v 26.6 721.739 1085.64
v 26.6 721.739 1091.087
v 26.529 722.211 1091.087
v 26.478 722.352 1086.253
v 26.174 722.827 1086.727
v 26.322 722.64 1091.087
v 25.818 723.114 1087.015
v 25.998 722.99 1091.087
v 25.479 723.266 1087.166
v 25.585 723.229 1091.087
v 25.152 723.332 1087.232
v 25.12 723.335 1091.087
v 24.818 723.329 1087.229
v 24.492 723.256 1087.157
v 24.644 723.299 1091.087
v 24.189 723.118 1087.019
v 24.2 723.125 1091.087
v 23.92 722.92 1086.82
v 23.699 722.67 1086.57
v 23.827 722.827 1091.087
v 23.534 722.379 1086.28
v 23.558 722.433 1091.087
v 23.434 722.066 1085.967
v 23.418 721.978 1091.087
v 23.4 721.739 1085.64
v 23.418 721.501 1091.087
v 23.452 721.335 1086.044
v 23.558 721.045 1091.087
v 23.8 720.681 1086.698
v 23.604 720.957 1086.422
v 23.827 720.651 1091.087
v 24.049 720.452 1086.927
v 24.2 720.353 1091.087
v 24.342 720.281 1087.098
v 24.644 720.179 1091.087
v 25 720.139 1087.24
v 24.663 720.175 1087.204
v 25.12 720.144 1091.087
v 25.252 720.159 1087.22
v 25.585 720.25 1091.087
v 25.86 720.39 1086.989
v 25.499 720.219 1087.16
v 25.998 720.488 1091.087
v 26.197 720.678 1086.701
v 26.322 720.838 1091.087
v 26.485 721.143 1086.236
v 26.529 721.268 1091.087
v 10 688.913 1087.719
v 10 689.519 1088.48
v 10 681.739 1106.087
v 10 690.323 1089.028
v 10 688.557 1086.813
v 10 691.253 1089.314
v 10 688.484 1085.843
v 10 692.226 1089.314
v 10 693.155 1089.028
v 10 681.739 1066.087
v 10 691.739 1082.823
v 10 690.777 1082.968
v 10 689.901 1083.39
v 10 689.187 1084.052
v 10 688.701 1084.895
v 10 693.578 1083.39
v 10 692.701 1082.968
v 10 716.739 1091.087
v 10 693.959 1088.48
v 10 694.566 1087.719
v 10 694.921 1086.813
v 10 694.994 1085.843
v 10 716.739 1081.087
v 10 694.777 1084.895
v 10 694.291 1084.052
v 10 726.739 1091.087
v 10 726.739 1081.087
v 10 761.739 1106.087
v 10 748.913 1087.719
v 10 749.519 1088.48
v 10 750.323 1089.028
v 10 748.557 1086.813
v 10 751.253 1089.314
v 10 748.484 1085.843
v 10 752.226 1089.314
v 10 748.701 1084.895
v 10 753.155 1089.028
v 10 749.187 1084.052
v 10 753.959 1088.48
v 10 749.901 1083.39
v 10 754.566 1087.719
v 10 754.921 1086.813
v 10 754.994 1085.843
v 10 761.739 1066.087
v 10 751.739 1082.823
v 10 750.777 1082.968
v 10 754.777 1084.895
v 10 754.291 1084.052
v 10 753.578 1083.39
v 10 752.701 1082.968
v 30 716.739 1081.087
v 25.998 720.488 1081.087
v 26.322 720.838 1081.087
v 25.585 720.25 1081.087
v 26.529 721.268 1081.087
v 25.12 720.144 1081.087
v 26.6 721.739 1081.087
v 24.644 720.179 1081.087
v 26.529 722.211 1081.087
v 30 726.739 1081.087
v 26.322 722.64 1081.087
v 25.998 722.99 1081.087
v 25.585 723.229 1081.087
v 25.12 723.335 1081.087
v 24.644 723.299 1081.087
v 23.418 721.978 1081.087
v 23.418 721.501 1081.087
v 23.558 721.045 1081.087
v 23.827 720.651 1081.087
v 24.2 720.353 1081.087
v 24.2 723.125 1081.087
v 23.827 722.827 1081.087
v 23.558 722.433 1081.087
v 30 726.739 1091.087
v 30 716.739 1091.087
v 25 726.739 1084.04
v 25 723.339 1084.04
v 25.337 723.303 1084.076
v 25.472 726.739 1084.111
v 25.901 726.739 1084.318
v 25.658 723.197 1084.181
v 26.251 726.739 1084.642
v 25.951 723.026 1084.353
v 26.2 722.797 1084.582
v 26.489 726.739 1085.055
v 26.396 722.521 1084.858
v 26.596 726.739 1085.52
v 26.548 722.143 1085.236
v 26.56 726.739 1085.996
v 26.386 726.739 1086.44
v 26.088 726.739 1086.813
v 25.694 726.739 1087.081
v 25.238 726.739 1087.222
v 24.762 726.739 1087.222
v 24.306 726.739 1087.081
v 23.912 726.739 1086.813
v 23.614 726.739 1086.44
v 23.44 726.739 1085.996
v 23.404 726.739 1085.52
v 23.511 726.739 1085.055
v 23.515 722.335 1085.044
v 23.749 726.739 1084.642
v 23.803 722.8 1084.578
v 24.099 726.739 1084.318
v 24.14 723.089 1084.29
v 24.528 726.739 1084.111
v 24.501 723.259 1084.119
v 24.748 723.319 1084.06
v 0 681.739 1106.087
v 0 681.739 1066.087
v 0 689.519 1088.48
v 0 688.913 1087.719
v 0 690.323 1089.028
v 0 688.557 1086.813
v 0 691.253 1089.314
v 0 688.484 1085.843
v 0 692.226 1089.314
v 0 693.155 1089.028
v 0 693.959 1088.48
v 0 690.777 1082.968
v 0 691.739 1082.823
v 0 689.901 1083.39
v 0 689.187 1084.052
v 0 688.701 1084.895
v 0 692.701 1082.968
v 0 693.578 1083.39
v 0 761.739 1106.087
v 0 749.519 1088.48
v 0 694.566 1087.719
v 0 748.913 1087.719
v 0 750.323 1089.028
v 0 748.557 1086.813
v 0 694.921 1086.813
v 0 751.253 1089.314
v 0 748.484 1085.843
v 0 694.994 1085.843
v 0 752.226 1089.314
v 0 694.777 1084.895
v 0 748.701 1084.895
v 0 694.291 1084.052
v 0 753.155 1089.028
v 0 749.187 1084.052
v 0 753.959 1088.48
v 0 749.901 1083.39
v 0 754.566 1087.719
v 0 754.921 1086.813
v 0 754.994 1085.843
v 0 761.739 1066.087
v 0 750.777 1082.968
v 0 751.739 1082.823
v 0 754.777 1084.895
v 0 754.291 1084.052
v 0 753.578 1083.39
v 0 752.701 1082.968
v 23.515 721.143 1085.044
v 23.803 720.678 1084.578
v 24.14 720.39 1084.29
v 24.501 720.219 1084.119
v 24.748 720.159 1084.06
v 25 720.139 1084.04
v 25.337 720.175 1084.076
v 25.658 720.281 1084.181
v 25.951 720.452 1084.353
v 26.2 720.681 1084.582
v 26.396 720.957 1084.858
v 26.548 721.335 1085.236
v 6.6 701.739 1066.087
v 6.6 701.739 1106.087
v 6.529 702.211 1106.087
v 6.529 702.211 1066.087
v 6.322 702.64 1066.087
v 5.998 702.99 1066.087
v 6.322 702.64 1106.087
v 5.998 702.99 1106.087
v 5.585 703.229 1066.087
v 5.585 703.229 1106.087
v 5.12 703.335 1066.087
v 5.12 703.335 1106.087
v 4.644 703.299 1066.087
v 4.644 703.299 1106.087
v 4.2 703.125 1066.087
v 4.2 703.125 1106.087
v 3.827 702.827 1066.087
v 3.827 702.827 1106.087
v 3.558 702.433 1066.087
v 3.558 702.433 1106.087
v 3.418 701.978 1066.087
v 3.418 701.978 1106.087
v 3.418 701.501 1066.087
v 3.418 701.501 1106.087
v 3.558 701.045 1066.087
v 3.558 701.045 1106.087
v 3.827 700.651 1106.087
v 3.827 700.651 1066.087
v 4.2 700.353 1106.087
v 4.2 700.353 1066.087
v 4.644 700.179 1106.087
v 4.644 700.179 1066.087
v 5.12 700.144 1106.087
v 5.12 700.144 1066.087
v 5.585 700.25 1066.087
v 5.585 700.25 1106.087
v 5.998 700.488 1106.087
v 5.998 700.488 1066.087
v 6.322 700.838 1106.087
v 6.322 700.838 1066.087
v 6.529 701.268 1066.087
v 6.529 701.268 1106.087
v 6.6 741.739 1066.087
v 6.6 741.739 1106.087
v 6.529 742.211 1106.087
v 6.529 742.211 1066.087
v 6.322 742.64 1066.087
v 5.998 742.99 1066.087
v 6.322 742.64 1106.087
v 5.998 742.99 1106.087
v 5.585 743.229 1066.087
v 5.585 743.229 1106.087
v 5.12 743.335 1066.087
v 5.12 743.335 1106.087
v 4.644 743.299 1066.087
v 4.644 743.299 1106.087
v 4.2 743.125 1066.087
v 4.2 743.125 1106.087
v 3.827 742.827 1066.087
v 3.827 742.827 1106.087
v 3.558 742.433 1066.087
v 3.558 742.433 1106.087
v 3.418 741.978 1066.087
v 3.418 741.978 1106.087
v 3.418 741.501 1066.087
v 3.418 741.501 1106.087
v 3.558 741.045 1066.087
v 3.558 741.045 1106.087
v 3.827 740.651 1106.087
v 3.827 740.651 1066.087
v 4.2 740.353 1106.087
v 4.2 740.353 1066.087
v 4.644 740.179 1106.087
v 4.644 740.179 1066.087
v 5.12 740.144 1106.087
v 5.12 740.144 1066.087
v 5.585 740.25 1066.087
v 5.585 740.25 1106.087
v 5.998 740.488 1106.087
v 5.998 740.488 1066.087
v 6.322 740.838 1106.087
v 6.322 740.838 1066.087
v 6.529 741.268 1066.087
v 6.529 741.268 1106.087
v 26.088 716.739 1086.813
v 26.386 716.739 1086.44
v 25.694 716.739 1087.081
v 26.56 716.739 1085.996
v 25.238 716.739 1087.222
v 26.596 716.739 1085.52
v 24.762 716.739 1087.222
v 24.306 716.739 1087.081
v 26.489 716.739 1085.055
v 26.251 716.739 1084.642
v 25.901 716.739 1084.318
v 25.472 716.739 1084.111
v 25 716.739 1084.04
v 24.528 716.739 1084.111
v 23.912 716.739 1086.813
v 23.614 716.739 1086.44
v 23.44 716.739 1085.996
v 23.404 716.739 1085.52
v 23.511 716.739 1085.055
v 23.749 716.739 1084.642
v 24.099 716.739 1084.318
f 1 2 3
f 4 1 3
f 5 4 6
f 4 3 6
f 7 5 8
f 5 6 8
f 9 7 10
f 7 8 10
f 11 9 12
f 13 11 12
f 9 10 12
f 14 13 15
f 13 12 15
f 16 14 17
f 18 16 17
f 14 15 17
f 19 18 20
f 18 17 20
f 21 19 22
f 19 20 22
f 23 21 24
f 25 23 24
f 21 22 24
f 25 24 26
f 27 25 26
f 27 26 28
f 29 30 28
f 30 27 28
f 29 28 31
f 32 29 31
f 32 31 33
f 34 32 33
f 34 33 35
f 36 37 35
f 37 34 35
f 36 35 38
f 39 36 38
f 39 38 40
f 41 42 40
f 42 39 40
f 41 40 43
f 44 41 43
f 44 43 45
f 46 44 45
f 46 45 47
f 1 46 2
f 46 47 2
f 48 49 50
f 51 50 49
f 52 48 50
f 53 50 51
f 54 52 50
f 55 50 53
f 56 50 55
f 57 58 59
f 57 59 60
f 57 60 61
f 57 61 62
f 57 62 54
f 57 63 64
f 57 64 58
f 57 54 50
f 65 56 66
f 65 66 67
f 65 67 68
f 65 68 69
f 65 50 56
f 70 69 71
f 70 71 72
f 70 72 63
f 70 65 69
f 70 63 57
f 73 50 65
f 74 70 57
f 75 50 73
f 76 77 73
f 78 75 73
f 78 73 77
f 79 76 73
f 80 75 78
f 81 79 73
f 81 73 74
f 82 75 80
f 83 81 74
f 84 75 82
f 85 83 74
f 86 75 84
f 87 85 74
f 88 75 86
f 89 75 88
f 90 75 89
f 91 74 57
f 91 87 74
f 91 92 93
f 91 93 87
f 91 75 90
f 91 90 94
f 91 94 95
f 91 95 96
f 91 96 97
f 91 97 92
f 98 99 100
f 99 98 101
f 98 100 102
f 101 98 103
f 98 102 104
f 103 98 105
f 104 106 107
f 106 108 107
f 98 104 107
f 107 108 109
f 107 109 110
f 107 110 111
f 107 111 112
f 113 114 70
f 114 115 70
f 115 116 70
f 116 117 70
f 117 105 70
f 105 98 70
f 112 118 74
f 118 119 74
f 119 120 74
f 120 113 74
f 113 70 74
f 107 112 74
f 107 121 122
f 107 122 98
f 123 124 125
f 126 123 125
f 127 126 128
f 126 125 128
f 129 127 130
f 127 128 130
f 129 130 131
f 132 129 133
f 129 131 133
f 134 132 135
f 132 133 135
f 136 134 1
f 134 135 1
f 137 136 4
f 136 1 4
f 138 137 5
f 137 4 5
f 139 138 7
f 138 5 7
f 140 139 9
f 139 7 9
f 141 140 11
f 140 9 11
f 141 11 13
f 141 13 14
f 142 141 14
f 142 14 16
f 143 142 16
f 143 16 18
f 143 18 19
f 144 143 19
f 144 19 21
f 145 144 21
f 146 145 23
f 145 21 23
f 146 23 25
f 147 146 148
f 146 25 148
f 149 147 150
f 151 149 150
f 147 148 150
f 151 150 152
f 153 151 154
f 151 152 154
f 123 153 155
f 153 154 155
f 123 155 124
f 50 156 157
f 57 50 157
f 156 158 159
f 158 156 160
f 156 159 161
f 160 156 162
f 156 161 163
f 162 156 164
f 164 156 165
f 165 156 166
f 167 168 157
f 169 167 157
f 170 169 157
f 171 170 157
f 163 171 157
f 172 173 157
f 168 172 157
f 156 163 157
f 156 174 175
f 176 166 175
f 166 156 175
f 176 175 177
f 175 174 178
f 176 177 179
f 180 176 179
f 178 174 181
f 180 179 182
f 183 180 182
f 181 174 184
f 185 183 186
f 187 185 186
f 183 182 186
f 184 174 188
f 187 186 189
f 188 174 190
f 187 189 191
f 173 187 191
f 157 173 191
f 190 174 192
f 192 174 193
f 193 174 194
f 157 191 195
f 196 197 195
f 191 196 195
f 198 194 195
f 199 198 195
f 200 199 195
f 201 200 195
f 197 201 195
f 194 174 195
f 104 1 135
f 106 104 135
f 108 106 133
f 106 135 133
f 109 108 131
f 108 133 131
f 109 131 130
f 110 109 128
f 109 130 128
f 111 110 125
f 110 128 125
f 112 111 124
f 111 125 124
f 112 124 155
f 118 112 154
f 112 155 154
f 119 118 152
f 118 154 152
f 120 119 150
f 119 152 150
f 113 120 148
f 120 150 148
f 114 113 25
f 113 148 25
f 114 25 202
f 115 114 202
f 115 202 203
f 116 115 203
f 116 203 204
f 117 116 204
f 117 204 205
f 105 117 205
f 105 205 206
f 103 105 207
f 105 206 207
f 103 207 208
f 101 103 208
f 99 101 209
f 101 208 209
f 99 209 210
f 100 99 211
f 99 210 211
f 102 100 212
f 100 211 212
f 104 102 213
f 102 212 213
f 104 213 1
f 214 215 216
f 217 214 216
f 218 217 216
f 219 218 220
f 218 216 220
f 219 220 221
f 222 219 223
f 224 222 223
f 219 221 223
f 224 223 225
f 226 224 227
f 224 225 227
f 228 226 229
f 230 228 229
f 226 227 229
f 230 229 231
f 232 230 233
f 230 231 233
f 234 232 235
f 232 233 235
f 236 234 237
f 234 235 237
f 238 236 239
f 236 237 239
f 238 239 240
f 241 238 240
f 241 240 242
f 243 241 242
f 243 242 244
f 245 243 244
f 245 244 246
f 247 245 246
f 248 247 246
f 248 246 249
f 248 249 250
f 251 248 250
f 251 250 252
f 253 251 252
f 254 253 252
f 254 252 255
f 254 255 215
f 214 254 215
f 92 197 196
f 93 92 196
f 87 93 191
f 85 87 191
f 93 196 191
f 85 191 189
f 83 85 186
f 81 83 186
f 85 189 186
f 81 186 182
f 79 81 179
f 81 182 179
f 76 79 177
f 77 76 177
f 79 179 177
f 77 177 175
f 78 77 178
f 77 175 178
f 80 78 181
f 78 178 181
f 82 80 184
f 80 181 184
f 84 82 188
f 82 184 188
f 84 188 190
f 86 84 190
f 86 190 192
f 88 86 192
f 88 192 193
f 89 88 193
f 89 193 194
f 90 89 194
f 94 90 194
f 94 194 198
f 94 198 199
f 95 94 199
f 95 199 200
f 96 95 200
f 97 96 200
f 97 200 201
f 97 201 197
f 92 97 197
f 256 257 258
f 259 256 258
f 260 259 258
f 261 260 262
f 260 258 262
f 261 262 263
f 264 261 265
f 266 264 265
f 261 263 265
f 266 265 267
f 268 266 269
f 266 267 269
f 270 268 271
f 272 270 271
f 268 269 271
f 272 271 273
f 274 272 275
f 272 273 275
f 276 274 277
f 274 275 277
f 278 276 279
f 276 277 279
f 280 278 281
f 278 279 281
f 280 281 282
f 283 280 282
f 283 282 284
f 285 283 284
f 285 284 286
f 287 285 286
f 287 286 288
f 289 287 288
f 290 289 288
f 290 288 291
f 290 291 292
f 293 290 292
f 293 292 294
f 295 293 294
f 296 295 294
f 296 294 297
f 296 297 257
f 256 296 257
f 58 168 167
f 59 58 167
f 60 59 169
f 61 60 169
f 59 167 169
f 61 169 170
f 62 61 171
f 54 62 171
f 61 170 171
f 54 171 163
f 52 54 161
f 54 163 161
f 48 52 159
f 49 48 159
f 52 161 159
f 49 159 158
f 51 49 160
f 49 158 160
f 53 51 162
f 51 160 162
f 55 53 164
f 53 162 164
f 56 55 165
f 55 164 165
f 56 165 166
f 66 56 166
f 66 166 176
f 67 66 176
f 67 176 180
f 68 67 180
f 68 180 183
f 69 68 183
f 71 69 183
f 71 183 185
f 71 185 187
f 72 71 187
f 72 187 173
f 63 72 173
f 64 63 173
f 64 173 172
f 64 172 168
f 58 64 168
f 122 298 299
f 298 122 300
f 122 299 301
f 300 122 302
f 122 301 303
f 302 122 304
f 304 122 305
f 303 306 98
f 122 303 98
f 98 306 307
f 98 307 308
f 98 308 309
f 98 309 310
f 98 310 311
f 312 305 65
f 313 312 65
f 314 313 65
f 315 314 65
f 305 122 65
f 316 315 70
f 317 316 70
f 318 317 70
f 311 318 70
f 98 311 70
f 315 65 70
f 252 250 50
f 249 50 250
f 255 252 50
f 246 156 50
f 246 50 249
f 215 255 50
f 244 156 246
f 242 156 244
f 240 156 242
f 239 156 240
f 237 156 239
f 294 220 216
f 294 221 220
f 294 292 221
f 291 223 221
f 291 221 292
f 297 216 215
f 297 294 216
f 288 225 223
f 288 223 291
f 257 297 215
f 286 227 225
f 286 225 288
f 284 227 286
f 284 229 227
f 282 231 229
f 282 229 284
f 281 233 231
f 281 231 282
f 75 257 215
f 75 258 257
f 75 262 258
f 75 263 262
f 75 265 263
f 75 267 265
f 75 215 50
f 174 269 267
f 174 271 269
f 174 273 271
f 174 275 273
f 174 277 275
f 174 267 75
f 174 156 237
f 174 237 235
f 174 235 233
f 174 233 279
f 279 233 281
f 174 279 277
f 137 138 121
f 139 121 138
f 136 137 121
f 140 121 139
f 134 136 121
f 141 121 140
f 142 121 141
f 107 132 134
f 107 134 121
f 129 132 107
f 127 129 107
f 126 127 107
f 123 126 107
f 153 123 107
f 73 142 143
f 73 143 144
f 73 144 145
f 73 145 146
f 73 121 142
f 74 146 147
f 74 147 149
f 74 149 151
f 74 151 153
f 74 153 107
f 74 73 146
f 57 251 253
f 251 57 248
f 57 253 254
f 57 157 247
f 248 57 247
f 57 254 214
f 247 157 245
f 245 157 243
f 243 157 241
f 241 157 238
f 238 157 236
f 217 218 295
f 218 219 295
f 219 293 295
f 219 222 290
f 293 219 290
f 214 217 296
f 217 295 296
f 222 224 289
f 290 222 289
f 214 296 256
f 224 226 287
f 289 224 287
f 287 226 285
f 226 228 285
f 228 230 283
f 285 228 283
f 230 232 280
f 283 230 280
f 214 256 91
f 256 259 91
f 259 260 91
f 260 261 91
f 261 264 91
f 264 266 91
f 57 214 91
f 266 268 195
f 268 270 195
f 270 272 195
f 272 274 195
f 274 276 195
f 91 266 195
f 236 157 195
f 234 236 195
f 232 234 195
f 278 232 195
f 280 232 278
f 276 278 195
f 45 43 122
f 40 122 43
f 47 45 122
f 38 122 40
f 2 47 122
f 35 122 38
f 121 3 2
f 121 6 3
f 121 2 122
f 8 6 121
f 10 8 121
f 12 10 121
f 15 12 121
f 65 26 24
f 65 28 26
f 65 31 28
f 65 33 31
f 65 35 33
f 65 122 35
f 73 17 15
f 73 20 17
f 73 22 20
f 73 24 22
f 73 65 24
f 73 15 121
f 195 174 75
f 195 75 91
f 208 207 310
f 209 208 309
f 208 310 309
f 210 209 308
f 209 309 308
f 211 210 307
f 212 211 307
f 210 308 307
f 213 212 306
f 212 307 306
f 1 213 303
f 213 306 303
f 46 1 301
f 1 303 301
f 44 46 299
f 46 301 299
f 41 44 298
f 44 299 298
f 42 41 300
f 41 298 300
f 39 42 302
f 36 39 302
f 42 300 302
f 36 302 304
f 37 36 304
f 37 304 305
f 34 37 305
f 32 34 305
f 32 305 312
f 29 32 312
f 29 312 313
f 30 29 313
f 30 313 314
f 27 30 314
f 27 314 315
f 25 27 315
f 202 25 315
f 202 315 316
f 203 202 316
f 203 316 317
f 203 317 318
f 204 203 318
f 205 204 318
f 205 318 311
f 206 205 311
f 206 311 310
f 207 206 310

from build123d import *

# Parameters (mm, degrees)
SKETCH1_W                      = 40
SKETCH1_H                      = 80
BOSS_EXTRUDE1_DEPTH            = 10
SKETCH2_W                      = 10
SKETCH2_H                      = 10
BOSS_EXTRUDE2_DEPTH            = 20
F_1_4_CLEARANCE_HOLE1_D        = 6.5278
F_1_4_CLEARANCE_HOLE1_DEPTH    = 21
F_1_4_CLEARANCE_HOLE1_TIP      = 1.961148974
M3_CLEARANCE_HOLE3_D           = 3.2
M3_CLEARANCE_HOLE4_D           = 3.2
M3_CLEARANCE_HOLE4_ON_FACE_2_D = 3.2


with BuildPart() as part:
    # Sketch1 → Boss-Extrude1 (new body)
    with BuildSketch(Plane(origin=(0, 0, 0), x_dir=(0, 0, -1), z_dir=(1, 0, 0))):
        with Locations((-1086.086956522, 721.739130435)):
            Rectangle(SKETCH1_W, SKETCH1_H)
    extrude(amount=BOSS_EXTRUDE1_DEPTH)

    # Sketch2 → Boss-Extrude2 (add)
    with BuildSketch(Plane(origin=(10, 0, 0), x_dir=(0, 0, -1), z_dir=(1, 0, 0))):
        with Locations((-1086.086956522, 721.739130435)):
            Rectangle(SKETCH2_W, SKETCH2_H)
    extrude(amount=BOSS_EXTRUDE2_DEPTH)

    # 1/4 Clearance Hole1
    with Locations(Plane(origin=(10, 751.739130435, 1086.086956522), x_dir=(0, 0, 1), z_dir=(1, 0, 0))):
        with Locations((0, 0), (0, 60)):
            Hole(F_1_4_CLEARANCE_HOLE1_D / 2, depth=F_1_4_CLEARANCE_HOLE1_DEPTH)
            with Locations((0, 0, -(F_1_4_CLEARANCE_HOLE1_DEPTH + F_1_4_CLEARANCE_HOLE1_TIP / 2))):  # 118° drill point
                Cone(0, F_1_4_CLEARANCE_HOLE1_D / 2, F_1_4_CLEARANCE_HOLE1_TIP, mode=Mode.SUBTRACT)

    # M3 Clearance Hole3 (through all)
    with Locations(Plane(origin=(5, 701.739130435, 1066.086956522), x_dir=(-1, 0, 0), z_dir=(0, 0, -1))):
        with Locations((0, 0), (0, 40)):
            Hole(M3_CLEARANCE_HOLE3_D / 2)

    # M3 Clearance Hole4 (through all)
    with Locations(Plane(origin=(25, 726.739130435, 1085.639739232), x_dir=(0, 0, 1), z_dir=(0, 1, 0))):
        with Locations((0, 0)):
            Hole(M3_CLEARANCE_HOLE4_D / 2)

    # M3 Clearance Hole4 on face 2 (through all)
    with Locations(Plane(origin=(25, 721.739130435, 1081.086956522), x_dir=(-1, 0, 0), z_dir=(0, 0, -1))):
        with Locations((0, 0)):
            Hole(M3_CLEARANCE_HOLE4_ON_FACE_2_D / 2)


solid = part.part
